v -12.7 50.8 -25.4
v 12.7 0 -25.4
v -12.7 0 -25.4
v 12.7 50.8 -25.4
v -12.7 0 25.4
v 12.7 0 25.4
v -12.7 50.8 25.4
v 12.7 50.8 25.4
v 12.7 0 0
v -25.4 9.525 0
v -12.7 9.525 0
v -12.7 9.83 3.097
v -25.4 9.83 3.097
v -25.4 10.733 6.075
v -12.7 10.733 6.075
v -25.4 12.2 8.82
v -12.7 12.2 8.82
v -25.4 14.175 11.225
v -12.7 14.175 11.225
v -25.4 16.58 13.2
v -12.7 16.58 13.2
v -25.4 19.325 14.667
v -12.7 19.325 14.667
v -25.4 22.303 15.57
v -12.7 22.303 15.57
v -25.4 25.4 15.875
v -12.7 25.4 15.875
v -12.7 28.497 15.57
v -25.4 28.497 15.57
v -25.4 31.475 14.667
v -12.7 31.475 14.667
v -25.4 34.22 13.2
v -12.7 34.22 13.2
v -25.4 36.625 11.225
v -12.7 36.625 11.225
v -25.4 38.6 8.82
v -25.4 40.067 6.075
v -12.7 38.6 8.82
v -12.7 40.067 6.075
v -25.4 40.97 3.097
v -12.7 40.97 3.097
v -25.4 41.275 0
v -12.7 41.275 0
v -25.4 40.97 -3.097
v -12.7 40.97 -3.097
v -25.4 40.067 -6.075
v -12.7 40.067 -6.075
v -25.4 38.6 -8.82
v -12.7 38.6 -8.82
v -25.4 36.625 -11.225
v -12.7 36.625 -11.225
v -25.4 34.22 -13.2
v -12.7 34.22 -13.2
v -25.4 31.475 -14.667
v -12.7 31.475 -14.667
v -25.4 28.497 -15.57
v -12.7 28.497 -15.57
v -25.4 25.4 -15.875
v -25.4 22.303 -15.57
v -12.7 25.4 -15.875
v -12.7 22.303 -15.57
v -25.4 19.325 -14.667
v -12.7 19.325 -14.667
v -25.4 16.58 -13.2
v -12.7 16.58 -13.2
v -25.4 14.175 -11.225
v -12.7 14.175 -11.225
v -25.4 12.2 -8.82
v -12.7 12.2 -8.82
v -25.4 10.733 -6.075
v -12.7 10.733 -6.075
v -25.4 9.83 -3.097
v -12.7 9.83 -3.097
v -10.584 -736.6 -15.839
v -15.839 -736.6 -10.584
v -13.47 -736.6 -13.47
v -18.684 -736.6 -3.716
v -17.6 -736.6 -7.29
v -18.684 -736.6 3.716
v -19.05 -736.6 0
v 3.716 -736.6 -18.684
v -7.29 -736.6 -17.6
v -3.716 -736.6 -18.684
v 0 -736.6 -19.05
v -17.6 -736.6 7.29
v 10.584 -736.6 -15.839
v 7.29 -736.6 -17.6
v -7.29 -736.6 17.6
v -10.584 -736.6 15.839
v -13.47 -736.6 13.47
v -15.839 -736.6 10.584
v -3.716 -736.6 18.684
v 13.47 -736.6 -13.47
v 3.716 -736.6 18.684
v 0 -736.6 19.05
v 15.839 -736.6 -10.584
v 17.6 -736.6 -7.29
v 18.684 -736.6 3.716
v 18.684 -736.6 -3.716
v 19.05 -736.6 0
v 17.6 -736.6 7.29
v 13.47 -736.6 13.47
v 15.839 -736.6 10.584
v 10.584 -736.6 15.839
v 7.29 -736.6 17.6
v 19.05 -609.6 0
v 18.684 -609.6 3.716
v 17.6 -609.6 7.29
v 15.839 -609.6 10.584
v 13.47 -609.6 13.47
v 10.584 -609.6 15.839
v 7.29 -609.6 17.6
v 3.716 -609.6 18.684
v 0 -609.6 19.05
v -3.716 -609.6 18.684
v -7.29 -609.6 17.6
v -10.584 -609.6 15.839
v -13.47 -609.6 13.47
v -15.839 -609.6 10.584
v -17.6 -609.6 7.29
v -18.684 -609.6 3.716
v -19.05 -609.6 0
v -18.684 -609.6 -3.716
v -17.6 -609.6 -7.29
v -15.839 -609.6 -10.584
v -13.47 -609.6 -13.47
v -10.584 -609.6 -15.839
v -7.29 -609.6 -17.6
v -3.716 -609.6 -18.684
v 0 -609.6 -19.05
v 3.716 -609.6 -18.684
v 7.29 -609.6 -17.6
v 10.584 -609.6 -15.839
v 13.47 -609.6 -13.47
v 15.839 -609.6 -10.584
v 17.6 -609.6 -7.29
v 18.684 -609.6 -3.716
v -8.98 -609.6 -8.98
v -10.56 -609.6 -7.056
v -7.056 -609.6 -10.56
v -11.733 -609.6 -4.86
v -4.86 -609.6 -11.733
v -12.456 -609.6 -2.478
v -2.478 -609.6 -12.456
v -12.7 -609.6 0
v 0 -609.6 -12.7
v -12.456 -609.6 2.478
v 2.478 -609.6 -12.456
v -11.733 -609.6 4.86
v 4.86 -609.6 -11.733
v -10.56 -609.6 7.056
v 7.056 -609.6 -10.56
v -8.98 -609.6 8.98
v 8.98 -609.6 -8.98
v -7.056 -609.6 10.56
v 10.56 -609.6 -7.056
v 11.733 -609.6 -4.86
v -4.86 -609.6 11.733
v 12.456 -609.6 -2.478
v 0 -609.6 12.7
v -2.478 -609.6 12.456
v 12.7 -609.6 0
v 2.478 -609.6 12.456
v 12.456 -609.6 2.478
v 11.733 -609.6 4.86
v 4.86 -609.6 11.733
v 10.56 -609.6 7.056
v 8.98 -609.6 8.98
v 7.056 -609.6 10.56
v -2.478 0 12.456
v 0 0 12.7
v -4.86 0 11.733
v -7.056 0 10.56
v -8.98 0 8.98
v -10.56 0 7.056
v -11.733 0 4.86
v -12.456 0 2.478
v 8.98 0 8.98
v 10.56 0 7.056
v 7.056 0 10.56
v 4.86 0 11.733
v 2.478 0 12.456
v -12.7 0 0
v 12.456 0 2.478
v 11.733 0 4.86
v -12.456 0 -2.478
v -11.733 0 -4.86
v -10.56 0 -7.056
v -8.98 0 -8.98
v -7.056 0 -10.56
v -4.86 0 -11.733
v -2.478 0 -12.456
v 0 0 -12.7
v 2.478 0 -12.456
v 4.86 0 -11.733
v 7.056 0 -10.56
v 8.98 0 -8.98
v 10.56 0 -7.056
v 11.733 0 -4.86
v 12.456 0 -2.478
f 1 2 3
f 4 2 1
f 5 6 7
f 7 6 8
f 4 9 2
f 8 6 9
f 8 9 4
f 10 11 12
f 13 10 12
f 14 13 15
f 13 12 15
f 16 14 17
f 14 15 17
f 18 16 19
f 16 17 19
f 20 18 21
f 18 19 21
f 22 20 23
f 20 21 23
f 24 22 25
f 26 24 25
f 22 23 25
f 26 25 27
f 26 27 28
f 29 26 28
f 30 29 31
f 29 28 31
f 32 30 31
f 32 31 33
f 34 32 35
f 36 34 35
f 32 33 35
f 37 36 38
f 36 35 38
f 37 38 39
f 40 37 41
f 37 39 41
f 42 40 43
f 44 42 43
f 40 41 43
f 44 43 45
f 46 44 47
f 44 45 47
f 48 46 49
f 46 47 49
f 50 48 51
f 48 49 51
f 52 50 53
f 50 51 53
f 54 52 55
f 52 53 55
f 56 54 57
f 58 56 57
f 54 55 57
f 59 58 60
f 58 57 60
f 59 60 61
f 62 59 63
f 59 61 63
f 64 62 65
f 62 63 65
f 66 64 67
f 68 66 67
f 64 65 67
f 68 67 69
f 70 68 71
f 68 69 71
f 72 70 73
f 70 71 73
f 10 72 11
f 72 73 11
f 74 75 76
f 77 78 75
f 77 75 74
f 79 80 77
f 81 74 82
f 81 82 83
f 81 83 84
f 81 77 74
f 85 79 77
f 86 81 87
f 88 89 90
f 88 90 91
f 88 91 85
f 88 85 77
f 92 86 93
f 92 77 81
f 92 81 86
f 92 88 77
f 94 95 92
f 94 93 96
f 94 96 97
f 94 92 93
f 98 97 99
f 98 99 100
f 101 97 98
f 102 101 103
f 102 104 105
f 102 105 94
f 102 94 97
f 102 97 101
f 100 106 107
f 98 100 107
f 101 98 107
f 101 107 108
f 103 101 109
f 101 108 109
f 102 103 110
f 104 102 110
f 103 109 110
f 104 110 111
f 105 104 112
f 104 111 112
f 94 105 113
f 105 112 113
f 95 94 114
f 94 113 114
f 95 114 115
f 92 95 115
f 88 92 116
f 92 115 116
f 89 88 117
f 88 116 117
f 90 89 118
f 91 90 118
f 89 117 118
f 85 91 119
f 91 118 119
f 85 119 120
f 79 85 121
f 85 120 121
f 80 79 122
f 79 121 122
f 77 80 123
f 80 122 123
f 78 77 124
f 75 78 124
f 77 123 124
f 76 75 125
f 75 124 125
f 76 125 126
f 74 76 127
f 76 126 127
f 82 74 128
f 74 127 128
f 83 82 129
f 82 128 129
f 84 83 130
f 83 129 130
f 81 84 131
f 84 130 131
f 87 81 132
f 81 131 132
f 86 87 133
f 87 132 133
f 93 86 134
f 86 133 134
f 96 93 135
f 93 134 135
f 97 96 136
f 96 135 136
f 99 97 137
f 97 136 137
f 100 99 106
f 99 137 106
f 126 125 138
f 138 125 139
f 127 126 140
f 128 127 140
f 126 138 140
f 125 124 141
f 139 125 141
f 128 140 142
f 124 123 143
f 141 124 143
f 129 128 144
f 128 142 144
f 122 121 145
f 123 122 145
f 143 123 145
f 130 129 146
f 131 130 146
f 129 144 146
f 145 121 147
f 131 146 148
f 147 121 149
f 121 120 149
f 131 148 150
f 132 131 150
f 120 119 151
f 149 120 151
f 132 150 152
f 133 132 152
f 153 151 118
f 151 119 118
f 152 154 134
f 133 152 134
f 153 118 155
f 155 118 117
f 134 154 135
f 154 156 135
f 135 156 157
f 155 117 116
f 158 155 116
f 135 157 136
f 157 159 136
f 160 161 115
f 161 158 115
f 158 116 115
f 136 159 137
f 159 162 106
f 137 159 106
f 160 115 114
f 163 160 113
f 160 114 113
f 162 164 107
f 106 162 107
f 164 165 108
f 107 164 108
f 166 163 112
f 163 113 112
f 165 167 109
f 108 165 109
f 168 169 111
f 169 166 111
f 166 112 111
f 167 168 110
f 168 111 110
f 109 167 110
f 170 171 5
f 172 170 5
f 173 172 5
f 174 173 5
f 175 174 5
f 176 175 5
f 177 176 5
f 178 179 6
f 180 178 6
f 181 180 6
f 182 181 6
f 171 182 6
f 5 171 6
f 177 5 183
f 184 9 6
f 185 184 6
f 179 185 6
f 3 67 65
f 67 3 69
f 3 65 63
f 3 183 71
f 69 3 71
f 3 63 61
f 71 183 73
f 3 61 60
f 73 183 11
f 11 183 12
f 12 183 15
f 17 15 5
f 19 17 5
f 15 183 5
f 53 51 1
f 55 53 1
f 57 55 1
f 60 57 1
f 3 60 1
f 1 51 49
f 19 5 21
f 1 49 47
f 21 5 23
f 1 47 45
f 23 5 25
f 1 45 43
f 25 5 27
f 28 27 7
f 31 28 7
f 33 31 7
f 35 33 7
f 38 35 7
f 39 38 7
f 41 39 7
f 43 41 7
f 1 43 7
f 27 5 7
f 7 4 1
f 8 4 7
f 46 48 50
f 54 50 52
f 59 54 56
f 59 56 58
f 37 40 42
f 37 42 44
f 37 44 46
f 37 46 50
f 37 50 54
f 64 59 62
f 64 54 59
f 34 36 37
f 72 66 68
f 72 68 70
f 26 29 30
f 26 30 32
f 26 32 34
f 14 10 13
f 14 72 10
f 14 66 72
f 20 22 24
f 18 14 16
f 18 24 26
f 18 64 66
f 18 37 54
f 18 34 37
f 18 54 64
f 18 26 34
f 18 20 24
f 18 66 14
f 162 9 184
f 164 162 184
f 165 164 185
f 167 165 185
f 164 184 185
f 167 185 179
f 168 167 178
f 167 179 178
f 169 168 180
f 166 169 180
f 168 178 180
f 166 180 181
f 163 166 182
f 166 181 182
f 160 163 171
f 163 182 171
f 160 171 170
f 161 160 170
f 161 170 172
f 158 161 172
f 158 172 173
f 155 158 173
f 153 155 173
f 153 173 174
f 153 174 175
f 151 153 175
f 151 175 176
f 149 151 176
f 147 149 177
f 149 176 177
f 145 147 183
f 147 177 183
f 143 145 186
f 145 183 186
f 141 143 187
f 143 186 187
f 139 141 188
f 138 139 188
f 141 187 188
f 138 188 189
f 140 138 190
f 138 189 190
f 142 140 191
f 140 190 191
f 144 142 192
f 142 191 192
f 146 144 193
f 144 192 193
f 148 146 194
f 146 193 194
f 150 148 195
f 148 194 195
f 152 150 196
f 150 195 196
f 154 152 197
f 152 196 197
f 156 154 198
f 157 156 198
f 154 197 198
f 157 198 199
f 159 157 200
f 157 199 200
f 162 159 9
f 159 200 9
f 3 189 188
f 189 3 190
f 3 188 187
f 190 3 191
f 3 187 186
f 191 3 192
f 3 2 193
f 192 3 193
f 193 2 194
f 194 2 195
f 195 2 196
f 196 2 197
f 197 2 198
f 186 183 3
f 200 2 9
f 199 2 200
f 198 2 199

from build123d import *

# Parameters (mm, degrees)
F0_R     = 12.7
F1_DEPTH = 609.6
F2_R     = 19.05
F2_R_2   = 12.7
F3_DEPTH = 127
F4_W     = 50.8
F4_H     = 50.8
F5_DEPTH = 12.7
F6_R     = 15.875
F7_DEPTH = 12.7


with BuildPart() as f1:
    # F0 (on Front) → F1 (new body)
    with BuildSketch(Plane.XZ):
        Circle(F0_R)
    extrude(amount=F1_DEPTH)

    # F2 (on face) → F3 (join)
    with BuildSketch(Plane.XZ.offset(609.6)):
        Circle(F2_R)
        Circle(F2_R_2, mode=Mode.SUBTRACT)
        Circle(F2_R_2)
    extrude(amount=F3_DEPTH)

    # F4 (on Right) → F5 (join, symmetric)
    with BuildSketch(Plane.YZ):
        with Locations((25.4, 0)):
            Rectangle(F4_W, F4_H)
    extrude(amount=F5_DEPTH, both=True)

    # F6 (on face) → F7 (join)
    with BuildSketch(Plane(origin=(-12.7, 0, 0), x_dir=(0, -1, 0), z_dir=(-1, 0, 0))):
        with Locations((-25.4, 0)):
            Circle(F6_R)
    extrude(amount=F7_DEPTH)


solid = f1.part
